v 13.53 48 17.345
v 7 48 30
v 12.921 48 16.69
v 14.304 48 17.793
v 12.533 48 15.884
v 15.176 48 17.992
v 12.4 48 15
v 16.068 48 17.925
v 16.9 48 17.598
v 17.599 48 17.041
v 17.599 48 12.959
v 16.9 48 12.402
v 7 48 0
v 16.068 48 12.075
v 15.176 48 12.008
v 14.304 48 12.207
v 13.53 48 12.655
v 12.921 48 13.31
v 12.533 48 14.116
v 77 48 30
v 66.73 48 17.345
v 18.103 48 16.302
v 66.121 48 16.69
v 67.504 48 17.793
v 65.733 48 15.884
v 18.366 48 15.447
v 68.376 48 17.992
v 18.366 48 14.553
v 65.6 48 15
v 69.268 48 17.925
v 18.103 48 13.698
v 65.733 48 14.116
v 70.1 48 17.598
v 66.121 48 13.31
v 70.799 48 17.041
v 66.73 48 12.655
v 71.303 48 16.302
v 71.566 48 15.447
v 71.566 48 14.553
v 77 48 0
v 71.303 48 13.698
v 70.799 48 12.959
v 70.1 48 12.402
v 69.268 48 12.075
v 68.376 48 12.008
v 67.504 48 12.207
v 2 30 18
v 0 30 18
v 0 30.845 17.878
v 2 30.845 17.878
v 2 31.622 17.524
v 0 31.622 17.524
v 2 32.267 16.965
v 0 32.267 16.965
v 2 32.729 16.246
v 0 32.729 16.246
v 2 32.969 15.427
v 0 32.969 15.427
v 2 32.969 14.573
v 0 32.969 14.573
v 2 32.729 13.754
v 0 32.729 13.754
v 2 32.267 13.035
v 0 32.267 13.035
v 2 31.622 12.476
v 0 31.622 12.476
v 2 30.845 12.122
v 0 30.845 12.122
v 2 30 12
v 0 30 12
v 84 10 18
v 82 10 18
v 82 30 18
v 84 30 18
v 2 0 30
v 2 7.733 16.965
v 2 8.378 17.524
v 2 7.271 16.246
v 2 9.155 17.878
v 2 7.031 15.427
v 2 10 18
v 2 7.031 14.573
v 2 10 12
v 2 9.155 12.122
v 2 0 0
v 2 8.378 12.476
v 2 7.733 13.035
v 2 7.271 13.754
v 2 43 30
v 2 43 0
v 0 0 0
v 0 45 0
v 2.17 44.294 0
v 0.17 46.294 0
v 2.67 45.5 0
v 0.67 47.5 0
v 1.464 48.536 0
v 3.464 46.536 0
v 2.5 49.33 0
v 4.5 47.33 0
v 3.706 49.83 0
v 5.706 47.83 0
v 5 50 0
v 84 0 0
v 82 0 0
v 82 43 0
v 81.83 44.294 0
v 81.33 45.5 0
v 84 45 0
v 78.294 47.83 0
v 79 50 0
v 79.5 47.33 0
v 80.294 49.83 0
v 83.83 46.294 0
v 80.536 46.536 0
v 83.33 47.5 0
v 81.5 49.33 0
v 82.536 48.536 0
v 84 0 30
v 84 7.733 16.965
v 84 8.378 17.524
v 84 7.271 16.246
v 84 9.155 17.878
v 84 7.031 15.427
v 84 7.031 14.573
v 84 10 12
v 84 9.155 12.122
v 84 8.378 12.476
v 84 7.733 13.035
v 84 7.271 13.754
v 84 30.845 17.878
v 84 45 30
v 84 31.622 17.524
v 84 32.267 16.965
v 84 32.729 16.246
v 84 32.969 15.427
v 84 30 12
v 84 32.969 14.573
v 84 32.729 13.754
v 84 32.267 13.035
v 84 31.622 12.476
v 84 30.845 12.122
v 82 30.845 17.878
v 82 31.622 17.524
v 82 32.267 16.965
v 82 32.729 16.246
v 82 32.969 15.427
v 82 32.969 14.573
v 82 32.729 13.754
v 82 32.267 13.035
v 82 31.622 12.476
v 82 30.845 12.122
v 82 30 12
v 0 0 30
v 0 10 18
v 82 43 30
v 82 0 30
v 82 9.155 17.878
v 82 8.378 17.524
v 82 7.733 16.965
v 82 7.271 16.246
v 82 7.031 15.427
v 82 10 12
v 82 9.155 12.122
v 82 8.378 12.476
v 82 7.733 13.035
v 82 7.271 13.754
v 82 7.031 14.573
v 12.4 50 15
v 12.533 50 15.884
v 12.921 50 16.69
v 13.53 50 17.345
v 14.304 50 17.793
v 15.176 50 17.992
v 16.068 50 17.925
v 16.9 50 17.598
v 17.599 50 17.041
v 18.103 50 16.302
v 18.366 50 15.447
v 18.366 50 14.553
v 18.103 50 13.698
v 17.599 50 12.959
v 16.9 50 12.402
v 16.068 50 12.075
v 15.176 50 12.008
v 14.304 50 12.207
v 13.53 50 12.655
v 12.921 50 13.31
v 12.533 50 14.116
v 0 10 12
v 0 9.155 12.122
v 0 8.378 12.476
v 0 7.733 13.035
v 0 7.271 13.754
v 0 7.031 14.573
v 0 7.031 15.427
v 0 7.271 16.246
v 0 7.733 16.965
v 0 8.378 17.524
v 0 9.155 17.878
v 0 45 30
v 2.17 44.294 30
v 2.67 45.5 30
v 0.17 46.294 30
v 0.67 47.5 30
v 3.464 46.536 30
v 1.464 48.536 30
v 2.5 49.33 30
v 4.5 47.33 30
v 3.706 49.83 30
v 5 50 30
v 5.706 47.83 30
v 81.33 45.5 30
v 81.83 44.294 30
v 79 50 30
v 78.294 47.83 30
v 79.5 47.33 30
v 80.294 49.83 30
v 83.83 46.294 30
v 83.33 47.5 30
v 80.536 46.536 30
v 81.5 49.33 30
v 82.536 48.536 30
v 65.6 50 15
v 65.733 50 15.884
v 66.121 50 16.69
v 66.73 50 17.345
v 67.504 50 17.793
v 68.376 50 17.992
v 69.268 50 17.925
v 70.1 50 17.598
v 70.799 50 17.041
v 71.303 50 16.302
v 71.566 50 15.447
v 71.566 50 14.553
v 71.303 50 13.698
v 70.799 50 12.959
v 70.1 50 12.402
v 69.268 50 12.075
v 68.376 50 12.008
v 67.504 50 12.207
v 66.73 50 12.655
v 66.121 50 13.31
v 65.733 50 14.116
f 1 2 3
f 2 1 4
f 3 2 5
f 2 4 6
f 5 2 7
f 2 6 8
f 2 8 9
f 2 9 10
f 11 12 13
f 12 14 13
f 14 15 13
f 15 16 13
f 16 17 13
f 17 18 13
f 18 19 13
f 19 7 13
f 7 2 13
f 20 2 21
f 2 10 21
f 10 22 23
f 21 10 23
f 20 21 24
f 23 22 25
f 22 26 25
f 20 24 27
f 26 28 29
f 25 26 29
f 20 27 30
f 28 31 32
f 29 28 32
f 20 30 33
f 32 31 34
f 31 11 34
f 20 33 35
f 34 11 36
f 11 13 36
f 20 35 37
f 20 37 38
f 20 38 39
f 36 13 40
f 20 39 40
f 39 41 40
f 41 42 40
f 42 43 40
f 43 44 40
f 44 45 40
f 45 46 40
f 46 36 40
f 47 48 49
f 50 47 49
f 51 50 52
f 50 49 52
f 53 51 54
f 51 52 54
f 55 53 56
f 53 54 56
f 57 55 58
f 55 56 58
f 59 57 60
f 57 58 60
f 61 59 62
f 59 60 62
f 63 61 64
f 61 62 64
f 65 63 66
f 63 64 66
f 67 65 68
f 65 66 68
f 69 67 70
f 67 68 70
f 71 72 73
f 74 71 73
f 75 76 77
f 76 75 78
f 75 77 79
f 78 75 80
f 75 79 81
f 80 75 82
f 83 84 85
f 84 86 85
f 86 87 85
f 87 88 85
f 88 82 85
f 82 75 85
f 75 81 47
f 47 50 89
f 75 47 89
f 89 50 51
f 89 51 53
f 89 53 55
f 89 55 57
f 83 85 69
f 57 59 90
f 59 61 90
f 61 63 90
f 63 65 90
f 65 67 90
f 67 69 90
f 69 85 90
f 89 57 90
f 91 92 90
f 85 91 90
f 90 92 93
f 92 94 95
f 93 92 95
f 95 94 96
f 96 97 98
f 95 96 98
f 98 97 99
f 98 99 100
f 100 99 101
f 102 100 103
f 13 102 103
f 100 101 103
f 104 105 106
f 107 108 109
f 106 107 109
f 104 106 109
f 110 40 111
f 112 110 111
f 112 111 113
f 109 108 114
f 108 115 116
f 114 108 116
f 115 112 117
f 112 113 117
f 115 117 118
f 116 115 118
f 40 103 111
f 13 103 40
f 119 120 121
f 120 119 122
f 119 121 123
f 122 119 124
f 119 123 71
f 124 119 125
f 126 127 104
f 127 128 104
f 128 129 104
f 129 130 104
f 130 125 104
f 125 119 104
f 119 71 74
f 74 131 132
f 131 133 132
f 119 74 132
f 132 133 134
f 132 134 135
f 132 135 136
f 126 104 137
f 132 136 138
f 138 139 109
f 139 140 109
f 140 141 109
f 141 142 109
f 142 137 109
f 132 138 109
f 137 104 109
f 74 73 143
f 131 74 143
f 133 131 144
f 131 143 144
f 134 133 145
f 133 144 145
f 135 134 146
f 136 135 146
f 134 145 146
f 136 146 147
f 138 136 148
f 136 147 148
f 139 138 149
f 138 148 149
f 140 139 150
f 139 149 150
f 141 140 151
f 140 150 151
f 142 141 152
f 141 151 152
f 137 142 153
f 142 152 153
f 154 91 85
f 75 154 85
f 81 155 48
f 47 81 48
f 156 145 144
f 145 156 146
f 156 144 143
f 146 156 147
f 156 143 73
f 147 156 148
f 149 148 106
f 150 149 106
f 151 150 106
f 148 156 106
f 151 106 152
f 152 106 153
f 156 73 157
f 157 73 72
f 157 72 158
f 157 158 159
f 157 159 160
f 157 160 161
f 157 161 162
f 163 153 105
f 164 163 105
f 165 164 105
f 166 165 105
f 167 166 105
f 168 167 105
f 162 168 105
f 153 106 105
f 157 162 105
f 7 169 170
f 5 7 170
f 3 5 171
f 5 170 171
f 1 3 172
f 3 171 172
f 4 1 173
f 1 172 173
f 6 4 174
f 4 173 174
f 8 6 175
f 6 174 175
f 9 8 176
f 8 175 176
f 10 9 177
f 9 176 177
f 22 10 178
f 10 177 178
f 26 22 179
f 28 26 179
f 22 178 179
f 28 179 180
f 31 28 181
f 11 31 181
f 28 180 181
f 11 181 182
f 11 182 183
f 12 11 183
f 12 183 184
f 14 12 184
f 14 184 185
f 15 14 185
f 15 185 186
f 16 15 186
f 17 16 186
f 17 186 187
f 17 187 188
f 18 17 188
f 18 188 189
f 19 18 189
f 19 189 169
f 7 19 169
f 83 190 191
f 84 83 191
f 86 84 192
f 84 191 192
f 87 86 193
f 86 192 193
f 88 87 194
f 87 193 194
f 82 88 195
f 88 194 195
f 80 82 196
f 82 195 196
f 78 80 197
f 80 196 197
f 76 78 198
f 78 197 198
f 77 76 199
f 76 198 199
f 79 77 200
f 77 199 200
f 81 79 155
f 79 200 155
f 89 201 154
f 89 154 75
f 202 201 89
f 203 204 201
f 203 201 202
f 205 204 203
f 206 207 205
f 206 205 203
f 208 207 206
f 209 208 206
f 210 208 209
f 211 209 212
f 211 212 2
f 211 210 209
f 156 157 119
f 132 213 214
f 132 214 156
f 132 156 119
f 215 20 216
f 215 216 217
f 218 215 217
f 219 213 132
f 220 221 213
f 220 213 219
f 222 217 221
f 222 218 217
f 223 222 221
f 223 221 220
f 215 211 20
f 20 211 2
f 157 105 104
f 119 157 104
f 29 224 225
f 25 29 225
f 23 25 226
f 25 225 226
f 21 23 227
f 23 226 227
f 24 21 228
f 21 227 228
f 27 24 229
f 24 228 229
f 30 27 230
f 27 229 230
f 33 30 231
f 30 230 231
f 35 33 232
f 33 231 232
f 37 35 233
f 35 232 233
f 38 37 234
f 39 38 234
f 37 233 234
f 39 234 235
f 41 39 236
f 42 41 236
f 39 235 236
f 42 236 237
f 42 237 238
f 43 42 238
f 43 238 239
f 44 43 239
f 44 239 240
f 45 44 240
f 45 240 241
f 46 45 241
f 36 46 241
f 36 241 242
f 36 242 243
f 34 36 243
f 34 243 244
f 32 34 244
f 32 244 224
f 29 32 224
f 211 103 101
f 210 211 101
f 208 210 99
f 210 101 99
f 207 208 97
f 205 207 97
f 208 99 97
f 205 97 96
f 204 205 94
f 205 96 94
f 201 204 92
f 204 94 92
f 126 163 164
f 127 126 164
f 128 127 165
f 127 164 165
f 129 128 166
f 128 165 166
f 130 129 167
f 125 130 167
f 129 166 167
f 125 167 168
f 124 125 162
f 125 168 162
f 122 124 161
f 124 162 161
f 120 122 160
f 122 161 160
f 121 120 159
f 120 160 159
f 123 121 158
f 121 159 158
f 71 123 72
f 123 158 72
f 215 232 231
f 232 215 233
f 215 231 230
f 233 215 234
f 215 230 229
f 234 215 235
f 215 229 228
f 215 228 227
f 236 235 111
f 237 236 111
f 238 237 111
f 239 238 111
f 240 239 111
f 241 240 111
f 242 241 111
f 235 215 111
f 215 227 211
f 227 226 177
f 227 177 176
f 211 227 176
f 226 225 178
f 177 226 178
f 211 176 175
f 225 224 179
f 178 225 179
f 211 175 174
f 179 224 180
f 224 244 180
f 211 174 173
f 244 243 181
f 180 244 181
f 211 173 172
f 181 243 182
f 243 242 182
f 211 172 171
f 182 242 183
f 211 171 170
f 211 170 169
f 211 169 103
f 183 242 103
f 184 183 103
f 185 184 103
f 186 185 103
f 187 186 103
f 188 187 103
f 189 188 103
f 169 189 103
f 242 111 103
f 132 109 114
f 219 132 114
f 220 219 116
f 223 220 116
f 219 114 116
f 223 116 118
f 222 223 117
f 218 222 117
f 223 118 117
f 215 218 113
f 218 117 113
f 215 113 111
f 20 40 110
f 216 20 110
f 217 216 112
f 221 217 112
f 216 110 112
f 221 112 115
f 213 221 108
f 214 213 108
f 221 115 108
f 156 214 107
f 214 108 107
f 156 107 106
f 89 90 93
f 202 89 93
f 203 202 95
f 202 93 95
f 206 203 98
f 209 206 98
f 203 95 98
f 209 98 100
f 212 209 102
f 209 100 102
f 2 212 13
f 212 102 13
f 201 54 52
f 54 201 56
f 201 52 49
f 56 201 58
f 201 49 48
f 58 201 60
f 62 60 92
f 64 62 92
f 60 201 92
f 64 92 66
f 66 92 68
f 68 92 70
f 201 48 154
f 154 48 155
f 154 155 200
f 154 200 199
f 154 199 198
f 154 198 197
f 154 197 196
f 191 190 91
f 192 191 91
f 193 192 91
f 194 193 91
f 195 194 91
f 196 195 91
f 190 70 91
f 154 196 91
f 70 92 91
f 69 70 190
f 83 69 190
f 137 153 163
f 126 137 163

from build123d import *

# Parameters (mm, degrees)
F1_DEPTH = 30
F3_DEPTH = 84.001
F4_R     = 3
F5_DEPTH = 50.001


with BuildPart() as f1:
    # F0 (on Top) → F1 (new body)
    with BuildSketch(Plane.XY):
        with BuildLine():
            Line((0, 45), (0, 0))
            Line((0, 0), (2, 0))
            Line((2, 0), (2, 43))
            ThreePointArc((2, 43), (3.464466, 46.535534), (7, 48))
            Line((7, 48), (77, 48))
            ThreePointArc((77, 48), (80.535534, 46.535534), (82, 43))
            Line((82, 43), (82, 0))
            Line((82, 0), (84, 0))
            Line((84, 0), (84, 45))
            ThreePointArc((84, 45), (82.535534, 48.535534), (79, 50))
            Line((79, 50), (5, 50))
            ThreePointArc((5, 50), (1.464466, 48.535534), (0, 45))
        make_face()
    extrude(amount=F1_DEPTH)

    # F2 (on face) → F3 (cut, through all)
    with BuildSketch(Plane(origin=(0, 0, 0), x_dir=(0, -1, 0), z_dir=(-1, 0, 0))):
        with BuildLine():
            Line((-10, 18), (-30, 18))
            ThreePointArc((-30, 18), (-33, 15), (-30, 12))
            Line((-30, 12), (-10, 12))
            ThreePointArc((-10, 12), (-7, 15), (-10, 18))
        make_face()
    extrude(amount=-F3_DEPTH, mode=Mode.SUBTRACT)

    # F4 (on face) → F5 (cut, through all)
    with BuildSketch(Plane(origin=(0, 50, 0), x_dir=(-1, 0, 0), z_dir=(0, 1, 0))):
        with Locations((-68.6, 15)):
            Circle(F4_R)
        with Locations((-15.4, 15)):
            Circle(F4_R)
    extrude(amount=-F5_DEPTH, mode=Mode.SUBTRACT)


solid = f1.part
